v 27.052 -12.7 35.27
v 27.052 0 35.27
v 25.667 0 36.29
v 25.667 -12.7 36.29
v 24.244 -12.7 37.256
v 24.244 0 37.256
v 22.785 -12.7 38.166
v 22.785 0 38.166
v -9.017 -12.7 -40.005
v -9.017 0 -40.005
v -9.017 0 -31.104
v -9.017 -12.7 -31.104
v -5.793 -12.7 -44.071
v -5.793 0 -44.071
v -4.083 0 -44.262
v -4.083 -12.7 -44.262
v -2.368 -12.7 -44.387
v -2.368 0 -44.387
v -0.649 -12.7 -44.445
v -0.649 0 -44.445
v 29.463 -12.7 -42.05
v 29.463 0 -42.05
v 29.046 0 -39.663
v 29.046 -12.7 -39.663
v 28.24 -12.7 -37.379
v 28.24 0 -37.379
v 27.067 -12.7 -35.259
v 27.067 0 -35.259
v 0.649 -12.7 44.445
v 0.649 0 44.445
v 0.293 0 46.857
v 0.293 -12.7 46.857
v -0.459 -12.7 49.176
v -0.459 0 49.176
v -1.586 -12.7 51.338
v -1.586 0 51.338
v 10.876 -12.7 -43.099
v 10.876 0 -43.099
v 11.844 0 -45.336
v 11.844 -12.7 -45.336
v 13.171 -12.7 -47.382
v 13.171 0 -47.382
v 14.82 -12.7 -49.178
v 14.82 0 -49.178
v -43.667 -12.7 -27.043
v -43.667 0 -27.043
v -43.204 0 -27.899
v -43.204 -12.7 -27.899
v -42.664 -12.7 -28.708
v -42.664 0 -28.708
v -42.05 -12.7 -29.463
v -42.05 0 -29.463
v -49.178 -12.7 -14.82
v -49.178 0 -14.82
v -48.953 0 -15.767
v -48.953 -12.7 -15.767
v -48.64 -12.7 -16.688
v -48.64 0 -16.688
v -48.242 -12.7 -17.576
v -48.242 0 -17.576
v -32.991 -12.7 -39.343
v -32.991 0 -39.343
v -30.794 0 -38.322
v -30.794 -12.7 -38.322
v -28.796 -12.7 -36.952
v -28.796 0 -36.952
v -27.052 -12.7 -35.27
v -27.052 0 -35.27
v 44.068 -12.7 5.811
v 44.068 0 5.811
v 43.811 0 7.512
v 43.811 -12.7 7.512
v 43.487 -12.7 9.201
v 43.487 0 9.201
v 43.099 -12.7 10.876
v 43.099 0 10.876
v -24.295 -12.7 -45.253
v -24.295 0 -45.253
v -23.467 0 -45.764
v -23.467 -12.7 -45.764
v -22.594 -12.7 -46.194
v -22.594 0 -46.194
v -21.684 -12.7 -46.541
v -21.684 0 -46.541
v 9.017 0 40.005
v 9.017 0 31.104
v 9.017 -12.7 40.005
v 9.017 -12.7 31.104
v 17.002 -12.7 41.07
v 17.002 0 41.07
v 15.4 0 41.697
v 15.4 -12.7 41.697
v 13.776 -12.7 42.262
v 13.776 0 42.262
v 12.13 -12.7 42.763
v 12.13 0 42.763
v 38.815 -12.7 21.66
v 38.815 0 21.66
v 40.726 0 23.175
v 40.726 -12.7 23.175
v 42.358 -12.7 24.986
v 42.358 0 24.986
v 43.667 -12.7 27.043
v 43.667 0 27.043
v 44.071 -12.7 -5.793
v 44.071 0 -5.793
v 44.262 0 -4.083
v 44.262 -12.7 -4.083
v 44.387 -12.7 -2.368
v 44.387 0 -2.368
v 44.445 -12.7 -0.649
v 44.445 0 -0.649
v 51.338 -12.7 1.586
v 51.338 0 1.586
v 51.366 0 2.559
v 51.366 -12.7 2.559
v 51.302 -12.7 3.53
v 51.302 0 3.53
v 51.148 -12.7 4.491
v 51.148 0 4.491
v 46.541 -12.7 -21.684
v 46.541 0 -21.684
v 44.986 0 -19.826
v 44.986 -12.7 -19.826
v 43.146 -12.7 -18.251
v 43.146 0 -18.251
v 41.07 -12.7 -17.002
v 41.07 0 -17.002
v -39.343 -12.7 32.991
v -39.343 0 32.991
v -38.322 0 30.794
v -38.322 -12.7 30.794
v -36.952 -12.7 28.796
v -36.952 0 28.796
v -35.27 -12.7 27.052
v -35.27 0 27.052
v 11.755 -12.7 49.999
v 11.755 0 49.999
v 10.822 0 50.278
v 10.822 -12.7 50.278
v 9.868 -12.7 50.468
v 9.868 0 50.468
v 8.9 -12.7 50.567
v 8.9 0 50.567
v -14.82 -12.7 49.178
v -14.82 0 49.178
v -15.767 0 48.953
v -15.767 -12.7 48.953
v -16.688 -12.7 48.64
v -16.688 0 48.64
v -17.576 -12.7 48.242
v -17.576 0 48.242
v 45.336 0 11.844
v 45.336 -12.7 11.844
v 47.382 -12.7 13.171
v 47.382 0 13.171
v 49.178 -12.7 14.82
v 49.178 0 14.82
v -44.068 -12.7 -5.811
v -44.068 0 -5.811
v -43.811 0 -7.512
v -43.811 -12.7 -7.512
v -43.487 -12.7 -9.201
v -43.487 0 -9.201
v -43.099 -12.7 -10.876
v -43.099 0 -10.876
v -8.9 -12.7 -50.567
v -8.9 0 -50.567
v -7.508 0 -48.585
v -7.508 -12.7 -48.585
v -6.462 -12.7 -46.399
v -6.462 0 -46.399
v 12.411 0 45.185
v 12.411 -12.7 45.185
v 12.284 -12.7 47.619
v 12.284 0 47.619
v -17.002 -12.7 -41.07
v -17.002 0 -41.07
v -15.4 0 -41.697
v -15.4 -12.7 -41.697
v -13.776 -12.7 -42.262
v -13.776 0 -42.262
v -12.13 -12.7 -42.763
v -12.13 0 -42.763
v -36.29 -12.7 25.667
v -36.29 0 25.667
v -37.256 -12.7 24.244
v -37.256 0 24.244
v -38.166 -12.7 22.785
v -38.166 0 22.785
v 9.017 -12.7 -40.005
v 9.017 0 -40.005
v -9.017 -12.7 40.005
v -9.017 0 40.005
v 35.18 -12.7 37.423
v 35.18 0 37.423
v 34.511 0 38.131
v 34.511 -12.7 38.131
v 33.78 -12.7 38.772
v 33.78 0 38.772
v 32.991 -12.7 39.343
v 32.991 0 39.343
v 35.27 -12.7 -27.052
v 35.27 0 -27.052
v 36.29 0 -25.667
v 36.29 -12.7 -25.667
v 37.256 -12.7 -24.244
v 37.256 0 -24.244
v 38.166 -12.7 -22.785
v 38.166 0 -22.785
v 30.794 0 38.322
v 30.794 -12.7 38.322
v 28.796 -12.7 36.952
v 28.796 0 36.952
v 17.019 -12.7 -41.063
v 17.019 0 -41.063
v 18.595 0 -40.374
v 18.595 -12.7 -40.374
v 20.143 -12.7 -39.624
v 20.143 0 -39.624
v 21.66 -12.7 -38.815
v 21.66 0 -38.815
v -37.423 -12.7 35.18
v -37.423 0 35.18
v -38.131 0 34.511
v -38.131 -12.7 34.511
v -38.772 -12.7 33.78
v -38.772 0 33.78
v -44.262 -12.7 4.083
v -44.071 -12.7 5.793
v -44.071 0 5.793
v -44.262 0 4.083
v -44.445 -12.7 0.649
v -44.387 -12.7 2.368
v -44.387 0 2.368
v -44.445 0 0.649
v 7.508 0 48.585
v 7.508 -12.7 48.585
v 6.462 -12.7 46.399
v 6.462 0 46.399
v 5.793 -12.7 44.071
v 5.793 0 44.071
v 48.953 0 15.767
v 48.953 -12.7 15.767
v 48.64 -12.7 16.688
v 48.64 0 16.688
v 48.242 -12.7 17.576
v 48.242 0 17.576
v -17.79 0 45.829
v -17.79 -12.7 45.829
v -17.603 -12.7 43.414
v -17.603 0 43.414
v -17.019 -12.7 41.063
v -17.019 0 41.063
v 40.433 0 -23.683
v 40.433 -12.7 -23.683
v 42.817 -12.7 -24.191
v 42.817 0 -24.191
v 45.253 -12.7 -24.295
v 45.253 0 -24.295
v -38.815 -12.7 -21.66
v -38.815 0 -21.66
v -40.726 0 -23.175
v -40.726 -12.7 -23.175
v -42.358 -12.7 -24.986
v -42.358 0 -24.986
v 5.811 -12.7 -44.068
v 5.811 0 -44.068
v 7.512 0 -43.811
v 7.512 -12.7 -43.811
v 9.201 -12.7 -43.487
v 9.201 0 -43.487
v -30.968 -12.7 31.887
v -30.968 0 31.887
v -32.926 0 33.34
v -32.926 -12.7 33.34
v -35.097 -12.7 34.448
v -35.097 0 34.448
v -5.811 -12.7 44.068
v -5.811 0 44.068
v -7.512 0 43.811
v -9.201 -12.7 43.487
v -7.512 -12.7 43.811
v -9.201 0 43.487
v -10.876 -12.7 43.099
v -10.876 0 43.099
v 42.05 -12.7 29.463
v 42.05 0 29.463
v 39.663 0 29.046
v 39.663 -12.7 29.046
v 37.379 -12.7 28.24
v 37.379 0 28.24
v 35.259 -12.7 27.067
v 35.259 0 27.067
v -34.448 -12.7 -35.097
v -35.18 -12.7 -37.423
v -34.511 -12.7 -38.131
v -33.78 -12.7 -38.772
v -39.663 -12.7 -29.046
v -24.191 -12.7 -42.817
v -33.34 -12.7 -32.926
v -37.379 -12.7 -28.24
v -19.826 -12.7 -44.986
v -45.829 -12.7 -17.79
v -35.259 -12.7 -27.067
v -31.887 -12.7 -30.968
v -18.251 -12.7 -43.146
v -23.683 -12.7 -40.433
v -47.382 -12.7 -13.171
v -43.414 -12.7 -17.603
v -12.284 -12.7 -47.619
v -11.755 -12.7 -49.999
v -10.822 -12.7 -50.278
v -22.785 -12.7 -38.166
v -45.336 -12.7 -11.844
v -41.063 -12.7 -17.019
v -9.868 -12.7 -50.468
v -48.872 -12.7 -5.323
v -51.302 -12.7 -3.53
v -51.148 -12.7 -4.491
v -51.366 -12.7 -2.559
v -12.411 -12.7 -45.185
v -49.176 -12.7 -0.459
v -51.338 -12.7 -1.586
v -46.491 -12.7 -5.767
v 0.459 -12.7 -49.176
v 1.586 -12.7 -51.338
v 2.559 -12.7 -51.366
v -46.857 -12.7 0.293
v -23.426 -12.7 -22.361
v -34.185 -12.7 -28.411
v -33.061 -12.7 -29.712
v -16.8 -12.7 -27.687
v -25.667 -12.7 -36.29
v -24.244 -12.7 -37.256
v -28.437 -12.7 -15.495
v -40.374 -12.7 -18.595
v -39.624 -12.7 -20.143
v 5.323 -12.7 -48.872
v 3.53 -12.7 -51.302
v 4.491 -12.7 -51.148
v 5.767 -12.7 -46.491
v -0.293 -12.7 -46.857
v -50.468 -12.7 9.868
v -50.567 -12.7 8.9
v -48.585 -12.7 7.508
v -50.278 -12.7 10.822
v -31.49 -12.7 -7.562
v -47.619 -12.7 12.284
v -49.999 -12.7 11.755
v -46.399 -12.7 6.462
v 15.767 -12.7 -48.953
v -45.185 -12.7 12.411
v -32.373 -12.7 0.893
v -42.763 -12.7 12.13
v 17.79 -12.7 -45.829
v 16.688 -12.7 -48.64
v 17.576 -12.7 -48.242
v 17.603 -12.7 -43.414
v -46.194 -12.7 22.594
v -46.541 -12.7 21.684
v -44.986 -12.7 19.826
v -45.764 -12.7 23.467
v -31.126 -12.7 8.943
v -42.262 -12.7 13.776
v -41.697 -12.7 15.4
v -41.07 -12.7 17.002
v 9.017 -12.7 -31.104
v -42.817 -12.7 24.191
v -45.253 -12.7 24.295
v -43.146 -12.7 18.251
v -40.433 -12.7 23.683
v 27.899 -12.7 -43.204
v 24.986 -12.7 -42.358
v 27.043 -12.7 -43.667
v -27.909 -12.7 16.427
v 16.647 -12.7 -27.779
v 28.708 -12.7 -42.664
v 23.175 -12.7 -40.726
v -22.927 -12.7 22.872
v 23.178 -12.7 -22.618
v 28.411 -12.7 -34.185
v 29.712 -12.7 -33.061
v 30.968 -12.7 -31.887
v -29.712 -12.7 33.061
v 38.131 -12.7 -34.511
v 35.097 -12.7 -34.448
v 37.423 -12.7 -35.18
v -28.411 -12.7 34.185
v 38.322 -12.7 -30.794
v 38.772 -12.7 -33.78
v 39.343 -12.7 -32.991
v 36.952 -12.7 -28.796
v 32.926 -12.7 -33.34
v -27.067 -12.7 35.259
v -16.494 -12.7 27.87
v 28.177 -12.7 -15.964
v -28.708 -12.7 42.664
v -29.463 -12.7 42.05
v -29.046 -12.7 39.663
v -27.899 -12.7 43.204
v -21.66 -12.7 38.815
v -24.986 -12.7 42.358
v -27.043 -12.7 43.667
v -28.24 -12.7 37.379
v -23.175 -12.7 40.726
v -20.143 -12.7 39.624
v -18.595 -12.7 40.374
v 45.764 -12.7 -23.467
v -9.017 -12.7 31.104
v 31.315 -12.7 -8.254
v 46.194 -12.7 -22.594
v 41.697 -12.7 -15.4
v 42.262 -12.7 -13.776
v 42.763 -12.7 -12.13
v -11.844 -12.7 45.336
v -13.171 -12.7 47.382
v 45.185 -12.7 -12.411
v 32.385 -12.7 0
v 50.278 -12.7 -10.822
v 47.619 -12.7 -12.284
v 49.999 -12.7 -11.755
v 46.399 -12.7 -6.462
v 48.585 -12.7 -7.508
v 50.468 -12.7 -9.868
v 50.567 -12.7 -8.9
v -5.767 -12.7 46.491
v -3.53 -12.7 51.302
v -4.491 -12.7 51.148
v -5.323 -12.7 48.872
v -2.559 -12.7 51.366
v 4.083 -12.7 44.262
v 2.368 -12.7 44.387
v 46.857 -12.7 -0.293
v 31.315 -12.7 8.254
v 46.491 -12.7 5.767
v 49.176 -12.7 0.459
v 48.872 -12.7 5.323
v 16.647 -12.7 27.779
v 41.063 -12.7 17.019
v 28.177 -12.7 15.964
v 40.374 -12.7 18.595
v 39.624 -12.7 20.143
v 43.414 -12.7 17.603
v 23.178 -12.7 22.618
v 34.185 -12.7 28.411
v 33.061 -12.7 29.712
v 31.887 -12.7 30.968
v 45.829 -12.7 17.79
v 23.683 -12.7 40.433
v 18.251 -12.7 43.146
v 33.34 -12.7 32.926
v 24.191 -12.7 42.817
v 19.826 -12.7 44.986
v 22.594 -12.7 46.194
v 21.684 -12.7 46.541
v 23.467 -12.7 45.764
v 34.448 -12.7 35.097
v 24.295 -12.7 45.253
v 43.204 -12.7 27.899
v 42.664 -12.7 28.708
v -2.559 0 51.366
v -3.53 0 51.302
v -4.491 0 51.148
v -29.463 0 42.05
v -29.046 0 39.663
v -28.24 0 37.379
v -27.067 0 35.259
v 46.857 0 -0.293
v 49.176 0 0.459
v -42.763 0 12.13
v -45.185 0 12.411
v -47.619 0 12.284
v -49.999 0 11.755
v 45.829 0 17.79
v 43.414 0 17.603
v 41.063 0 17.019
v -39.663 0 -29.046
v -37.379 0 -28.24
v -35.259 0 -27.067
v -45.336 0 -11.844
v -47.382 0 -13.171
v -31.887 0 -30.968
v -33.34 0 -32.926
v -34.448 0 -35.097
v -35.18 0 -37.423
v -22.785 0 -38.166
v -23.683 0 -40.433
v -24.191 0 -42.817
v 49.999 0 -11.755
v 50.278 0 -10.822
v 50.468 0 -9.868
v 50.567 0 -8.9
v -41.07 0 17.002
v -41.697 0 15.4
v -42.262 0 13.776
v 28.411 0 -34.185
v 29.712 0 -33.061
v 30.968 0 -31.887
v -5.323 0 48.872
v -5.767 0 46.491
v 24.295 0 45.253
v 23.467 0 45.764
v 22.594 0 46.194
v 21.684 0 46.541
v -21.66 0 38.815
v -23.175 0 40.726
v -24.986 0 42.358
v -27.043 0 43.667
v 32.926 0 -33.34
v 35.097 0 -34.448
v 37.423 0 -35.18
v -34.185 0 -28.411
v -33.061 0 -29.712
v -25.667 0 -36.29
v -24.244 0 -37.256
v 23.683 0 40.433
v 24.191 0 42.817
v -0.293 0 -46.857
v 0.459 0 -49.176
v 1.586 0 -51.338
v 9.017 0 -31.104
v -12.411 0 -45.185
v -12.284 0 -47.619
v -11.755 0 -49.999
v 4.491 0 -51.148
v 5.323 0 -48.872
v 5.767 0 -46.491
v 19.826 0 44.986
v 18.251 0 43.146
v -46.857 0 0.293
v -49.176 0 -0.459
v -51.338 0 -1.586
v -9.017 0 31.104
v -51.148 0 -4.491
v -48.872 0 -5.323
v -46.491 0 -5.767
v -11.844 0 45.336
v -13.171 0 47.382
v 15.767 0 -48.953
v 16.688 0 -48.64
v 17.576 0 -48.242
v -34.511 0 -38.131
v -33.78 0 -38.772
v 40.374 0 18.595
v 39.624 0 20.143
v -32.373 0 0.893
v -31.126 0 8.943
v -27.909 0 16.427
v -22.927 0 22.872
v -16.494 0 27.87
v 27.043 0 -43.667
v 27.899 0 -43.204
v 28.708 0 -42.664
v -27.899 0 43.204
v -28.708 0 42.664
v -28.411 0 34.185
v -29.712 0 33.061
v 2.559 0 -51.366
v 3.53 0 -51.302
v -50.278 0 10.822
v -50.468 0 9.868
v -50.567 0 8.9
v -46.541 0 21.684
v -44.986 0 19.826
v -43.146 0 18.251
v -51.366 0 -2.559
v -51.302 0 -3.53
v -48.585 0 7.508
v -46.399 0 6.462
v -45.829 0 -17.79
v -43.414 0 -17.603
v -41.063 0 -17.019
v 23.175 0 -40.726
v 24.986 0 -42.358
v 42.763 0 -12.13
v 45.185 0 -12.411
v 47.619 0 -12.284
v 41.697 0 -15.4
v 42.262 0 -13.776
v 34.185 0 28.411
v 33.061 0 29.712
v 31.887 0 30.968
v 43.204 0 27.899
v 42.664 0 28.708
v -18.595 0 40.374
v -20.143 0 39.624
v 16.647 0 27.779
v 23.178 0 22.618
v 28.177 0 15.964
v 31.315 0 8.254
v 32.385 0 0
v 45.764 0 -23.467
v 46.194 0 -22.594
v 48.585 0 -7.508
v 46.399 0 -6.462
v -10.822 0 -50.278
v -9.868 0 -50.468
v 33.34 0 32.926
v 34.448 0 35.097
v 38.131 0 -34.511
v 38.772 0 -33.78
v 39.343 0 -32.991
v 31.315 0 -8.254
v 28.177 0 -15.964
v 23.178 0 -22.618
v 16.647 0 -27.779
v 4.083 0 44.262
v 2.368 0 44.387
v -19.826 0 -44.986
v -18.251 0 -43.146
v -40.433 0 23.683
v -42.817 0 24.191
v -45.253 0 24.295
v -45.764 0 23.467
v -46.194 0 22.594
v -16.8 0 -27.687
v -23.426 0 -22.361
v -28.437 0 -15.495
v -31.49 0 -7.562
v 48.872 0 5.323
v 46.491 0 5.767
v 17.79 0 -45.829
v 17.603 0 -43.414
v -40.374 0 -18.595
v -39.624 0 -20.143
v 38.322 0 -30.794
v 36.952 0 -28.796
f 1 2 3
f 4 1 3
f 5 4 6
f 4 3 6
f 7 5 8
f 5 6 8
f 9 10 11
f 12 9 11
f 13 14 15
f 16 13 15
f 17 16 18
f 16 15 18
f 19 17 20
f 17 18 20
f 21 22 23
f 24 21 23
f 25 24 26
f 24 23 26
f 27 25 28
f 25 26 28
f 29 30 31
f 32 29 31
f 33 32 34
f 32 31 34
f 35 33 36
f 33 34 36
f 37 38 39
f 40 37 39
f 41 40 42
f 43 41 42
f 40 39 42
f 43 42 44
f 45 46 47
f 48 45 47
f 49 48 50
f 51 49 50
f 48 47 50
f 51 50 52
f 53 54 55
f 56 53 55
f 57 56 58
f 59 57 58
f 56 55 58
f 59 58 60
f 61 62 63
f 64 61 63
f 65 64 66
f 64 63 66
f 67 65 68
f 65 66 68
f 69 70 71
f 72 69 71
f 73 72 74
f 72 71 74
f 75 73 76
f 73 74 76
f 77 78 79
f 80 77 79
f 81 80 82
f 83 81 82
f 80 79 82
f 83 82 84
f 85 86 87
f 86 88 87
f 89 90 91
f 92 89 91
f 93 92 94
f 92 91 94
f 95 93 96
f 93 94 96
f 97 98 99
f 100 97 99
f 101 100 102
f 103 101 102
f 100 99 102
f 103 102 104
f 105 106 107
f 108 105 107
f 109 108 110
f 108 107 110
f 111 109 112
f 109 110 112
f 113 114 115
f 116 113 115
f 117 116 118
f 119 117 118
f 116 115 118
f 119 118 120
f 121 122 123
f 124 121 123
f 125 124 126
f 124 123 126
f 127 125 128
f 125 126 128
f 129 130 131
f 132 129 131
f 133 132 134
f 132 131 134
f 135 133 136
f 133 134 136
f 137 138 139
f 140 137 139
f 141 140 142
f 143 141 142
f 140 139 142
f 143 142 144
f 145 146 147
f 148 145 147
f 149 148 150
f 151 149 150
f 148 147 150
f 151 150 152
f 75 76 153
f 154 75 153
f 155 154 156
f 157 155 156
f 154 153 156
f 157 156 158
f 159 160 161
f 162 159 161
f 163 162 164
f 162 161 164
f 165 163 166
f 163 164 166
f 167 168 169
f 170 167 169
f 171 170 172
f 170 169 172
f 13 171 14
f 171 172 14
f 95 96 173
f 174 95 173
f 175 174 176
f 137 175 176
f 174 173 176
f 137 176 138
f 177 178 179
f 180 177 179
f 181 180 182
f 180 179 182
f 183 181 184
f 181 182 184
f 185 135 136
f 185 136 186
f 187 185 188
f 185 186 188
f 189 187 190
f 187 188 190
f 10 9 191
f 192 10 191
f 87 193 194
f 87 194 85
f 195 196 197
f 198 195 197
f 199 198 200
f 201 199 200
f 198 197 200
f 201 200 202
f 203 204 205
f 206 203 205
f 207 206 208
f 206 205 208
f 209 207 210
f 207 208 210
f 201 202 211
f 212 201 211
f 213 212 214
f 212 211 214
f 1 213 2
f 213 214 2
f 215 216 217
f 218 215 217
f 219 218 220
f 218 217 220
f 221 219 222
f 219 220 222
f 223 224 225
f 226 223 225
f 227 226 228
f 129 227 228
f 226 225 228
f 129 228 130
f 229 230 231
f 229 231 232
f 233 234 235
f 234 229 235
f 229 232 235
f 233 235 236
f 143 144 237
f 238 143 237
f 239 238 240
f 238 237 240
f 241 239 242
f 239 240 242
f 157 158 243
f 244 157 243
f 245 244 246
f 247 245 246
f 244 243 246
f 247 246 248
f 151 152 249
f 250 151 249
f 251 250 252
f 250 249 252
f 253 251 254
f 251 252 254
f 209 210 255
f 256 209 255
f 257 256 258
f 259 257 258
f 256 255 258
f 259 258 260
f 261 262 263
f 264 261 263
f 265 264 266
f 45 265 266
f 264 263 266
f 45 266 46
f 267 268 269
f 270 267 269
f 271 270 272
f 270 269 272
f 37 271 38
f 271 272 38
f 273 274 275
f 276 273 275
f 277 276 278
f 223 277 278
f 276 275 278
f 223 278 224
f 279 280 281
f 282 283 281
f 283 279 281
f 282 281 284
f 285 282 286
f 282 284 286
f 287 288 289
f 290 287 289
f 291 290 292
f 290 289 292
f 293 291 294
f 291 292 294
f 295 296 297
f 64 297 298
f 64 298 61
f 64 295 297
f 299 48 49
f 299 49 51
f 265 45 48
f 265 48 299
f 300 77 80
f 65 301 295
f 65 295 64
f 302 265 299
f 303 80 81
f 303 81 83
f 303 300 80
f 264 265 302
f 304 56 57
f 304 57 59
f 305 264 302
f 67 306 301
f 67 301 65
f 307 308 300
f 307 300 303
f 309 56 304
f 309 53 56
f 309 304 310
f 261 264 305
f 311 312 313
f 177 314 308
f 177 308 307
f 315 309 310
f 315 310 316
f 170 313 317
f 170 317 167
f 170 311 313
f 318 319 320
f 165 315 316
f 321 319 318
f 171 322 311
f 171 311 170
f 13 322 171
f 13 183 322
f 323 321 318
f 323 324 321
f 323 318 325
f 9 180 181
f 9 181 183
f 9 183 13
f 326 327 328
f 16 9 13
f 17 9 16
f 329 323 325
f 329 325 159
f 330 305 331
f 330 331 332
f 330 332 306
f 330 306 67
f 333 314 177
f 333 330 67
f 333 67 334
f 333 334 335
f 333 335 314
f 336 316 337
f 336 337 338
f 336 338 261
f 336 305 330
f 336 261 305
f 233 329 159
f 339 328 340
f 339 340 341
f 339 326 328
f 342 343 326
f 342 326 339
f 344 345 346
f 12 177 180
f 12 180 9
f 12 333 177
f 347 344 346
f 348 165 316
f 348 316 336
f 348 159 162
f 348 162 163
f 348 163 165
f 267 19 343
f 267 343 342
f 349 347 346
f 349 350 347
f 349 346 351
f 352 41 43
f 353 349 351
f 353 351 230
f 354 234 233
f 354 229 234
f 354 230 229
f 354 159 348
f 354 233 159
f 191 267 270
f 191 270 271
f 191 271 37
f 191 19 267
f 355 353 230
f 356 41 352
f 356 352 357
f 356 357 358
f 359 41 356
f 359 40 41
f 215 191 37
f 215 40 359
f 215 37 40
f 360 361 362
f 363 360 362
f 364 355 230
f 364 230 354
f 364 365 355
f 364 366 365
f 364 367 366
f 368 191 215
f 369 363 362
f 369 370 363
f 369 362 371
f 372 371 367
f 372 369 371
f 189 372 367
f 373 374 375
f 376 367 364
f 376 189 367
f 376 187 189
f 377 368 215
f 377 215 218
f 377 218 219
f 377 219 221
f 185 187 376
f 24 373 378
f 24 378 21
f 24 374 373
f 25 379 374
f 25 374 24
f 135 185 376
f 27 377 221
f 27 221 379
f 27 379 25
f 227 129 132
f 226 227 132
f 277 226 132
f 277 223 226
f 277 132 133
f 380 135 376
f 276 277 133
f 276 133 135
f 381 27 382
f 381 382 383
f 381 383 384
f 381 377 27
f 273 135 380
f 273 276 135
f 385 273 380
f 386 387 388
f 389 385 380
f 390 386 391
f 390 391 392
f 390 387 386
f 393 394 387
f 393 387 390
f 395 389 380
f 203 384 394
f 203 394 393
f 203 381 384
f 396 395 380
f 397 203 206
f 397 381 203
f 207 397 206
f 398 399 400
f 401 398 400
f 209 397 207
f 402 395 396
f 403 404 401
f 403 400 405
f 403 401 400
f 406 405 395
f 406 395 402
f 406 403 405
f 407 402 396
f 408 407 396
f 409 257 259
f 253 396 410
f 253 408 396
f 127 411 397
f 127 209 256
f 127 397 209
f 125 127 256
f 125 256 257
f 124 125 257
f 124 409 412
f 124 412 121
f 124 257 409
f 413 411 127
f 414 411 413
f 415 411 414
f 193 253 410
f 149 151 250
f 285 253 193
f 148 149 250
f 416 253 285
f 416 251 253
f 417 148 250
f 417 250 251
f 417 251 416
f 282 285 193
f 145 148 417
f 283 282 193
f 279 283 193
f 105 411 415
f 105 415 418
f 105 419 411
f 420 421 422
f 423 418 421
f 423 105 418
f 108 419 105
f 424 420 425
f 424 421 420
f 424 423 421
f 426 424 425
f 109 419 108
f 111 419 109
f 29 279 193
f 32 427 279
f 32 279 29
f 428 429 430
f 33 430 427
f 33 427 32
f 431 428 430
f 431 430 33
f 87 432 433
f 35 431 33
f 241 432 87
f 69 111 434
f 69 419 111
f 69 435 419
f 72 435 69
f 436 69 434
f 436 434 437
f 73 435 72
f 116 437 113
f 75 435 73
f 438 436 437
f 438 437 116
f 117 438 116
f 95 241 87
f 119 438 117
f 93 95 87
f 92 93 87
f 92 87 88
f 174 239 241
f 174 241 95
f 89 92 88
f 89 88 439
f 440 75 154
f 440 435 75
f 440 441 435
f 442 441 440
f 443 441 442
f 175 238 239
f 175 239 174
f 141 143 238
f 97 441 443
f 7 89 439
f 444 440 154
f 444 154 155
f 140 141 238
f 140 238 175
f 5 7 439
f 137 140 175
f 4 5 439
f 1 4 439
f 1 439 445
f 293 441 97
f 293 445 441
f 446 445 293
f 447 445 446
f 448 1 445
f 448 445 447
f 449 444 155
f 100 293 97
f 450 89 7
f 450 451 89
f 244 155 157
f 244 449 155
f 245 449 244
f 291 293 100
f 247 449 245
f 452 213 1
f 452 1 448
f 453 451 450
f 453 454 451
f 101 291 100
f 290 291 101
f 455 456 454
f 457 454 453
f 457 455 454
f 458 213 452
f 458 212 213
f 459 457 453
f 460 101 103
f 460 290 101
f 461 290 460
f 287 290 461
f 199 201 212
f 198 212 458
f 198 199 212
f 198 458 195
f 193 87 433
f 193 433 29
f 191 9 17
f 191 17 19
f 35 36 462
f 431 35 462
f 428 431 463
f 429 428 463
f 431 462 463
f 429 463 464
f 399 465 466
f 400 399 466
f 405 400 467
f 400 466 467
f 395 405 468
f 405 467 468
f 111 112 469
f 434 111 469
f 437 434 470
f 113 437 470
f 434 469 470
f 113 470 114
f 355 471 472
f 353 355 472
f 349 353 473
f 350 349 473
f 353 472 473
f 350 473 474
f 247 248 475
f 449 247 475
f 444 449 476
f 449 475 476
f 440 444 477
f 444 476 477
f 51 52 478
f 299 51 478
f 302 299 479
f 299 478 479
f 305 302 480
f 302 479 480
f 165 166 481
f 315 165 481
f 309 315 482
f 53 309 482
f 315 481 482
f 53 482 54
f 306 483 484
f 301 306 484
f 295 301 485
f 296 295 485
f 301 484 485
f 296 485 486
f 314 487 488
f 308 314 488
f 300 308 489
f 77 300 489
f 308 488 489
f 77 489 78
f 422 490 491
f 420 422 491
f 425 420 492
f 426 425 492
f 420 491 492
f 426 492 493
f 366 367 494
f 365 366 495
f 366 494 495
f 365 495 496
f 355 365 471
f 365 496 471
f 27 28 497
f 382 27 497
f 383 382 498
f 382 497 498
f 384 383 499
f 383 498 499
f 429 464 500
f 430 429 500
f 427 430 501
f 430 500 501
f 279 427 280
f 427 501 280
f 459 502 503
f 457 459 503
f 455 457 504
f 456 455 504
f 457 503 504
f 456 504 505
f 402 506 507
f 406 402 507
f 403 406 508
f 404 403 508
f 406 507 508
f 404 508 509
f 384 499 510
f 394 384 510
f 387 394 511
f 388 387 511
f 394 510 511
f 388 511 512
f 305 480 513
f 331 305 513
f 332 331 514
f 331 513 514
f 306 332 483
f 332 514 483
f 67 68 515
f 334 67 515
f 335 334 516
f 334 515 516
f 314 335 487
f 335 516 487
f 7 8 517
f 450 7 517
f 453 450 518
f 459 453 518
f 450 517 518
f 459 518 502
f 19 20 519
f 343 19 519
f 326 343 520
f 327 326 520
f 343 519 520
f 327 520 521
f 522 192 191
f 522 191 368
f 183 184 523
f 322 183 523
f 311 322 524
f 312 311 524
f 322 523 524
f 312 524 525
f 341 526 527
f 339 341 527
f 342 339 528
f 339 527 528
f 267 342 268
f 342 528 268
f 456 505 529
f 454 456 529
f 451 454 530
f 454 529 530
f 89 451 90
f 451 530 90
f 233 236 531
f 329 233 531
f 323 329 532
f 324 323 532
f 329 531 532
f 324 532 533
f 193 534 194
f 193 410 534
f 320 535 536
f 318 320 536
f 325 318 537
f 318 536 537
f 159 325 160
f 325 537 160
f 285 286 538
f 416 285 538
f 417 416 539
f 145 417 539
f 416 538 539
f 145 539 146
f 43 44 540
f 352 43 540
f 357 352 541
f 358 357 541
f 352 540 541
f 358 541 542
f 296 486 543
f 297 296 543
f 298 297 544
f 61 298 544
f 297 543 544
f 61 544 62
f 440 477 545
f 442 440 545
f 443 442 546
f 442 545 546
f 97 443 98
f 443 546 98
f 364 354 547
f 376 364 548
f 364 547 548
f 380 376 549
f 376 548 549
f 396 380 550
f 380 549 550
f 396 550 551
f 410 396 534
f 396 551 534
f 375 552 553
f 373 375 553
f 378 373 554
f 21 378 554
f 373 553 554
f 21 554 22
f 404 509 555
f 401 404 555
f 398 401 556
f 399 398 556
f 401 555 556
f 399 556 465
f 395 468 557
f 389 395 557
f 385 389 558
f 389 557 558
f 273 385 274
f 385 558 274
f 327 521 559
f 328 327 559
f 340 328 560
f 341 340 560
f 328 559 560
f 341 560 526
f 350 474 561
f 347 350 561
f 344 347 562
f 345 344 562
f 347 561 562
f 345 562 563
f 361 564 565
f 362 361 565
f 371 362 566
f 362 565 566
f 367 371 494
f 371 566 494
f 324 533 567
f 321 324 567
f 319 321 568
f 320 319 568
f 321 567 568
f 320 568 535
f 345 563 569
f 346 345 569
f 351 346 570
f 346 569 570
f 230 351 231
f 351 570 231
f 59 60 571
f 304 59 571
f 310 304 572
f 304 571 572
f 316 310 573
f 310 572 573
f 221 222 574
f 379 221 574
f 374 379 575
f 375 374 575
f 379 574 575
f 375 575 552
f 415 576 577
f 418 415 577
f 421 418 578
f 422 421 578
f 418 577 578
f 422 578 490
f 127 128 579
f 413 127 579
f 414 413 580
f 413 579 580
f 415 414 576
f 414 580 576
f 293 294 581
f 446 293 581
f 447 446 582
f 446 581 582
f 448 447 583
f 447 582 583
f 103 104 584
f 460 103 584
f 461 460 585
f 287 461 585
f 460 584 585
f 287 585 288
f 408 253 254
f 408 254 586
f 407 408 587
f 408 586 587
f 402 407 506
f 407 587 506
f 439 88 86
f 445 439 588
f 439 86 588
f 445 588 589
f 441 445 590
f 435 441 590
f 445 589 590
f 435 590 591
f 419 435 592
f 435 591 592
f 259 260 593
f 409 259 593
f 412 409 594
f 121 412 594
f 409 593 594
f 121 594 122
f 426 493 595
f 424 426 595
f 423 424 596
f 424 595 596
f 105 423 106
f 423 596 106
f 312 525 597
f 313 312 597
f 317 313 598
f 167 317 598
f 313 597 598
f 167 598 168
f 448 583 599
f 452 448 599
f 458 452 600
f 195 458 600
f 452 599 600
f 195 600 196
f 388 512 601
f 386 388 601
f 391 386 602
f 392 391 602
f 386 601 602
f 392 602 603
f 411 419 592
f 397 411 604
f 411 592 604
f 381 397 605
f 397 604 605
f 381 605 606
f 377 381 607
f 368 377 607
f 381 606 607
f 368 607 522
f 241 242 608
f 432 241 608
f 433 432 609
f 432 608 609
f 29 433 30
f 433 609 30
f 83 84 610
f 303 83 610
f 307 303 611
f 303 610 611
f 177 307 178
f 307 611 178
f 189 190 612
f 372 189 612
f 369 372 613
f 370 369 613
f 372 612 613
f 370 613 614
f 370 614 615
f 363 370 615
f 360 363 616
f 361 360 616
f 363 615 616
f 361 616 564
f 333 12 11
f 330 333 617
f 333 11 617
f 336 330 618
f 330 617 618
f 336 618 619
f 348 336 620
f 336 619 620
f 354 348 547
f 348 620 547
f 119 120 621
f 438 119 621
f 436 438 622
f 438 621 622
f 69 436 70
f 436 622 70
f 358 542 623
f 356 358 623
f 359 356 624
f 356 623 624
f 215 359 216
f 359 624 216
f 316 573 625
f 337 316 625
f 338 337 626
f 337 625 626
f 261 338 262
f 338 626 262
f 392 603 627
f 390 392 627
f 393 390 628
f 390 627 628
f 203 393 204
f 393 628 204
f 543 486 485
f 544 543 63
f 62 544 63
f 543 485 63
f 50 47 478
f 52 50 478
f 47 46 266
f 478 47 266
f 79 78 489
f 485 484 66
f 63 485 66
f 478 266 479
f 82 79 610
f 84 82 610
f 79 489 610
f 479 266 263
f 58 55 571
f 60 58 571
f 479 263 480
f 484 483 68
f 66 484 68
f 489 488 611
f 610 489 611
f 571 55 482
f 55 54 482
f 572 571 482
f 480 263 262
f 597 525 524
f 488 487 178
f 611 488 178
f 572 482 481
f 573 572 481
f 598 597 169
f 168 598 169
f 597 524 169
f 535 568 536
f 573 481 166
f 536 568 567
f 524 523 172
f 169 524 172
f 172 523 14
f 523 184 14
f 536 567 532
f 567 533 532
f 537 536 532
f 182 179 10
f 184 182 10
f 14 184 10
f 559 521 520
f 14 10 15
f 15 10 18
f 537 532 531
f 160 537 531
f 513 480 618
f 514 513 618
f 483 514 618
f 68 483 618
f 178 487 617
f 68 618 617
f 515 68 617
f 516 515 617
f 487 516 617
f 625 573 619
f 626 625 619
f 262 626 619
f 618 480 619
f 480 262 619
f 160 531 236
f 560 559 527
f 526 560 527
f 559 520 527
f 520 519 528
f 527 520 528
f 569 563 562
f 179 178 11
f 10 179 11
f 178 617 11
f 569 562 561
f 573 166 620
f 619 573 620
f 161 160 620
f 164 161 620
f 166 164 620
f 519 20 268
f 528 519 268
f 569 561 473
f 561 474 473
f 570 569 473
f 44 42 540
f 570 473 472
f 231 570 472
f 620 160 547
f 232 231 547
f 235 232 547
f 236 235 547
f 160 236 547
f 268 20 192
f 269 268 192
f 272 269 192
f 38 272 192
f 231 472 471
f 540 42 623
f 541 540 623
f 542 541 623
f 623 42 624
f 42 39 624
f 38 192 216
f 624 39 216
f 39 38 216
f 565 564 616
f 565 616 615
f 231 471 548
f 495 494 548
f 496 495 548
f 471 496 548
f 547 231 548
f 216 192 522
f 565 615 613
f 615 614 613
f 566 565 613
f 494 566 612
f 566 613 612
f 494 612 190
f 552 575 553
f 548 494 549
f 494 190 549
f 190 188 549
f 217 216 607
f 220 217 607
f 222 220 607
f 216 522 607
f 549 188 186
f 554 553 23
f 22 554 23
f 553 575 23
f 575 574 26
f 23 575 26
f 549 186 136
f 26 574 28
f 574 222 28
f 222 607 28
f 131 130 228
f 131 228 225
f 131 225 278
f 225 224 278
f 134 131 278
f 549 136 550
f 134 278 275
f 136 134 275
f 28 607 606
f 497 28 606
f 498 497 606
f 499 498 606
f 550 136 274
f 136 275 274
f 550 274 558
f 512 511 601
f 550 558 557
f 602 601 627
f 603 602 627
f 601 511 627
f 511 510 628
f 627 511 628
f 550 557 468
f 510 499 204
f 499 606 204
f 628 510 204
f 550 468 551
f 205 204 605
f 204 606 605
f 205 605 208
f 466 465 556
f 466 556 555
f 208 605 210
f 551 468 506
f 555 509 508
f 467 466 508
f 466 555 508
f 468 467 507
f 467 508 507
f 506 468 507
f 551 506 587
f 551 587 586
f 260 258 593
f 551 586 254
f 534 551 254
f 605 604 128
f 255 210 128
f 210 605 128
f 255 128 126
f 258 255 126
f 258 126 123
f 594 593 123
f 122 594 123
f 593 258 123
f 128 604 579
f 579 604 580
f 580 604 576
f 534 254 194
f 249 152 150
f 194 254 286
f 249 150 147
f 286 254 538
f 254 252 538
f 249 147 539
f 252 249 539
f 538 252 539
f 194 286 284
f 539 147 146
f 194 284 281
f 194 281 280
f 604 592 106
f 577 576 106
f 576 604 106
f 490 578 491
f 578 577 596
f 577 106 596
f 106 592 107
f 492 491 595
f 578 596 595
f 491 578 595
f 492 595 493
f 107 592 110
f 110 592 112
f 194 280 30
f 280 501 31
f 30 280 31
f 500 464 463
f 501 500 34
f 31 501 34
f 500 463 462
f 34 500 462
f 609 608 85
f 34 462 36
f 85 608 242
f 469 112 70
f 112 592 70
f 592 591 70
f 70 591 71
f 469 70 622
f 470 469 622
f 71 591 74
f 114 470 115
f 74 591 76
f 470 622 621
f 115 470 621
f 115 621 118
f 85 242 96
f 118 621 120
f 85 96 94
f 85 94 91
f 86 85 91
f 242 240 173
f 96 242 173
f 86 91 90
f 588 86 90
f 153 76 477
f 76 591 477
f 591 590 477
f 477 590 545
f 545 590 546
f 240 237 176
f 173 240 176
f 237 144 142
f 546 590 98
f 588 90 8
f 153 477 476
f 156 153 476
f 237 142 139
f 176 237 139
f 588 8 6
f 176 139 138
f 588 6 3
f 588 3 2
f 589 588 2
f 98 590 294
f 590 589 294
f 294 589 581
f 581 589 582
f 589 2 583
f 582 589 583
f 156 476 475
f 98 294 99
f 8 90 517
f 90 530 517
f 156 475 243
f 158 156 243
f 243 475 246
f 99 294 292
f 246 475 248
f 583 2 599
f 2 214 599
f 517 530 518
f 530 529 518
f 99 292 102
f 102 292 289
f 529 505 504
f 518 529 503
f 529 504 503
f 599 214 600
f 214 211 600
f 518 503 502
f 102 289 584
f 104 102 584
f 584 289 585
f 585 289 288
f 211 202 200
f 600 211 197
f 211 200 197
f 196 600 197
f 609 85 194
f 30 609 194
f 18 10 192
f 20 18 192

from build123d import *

# Parameters (mm, degrees)
F1_DEPTH = 12.7
F2_COUNT = 24
F2_ANGLE = 345
F3_W     = 18.034
F3_H     = 80.01
F4_DEPTH = 25.4


with BuildPart() as f1:
    # F0 (on Front) → F1 (new body)
    with BuildSketch(Plane.XZ):
        with BuildLine():
            ThreePointArc((-5.811181, 44.0685), (-29.304398, -33.422369), (44.45, 0))
            ThreePointArc((44.45, 0), (31.659609, 31.200508), (0.649249, 44.445258))
            ThreePointArc((0.649249, 44.445258), (-2.587831, 44.374606), (-5.811181, 44.0685))
        make_face()
        with BuildLine():
            ThreePointArc((7.516504, 31.500641), (25.418598, 20.066966), (32.385, 0))
            ThreePointArc((32.385, 0), (25.418598, -20.066966), (7.516504, -31.500641))
            Line((7.516504, -31.500641), (7.516504, -39.878))
            Line((7.516504, -39.878), (-7.871554, -39.878))
            Line((-7.871554, -39.878), (-7.871554, -31.4138))
            ThreePointArc((-7.871554, -31.4138), (-32.385, 0), (-7.871554, 31.4138))
            Line((-7.871554, 31.4138), (-7.871554, 39.878))
            Line((-7.871554, 39.878), (7.516504, 39.878))
            Line((7.516504, 39.878), (7.516504, 31.500641))
        make_face(mode=Mode.SUBTRACT)
        with BuildLine():
            ThreePointArc((-5.811181, 44.0685), (-2.587831, 44.374606), (0.649249, 44.445258))
            ThreePointArc((0.649249, 44.445258), (-0.034359, 48.03246), (-1.586488, 51.337946))
            ThreePointArc((-1.586488, 51.337946), (-3.045553, 51.345424), (-4.491159, 51.147564))
            ThreePointArc((-4.491159, 51.147564), (-5.594305, 47.690663), (-5.811181, 44.0685))
        make_face()
    extrude(amount=F1_DEPTH)

    # F2: F1 ×24 about axis
    f2_axis = Axis((0, 0, 0), (0, 1, 0))


with BuildPart() as f1_1:
    add(f1.part)
    for i in range(1, F2_COUNT):
        add(f1.part.rotate(f2_axis, i * F2_ANGLE / (F2_COUNT - 1)))

    # F3 (on Front) → F4 (cut, symmetric)
    with BuildSketch(Plane.XZ):
        Rectangle(F3_W, F3_H)
    extrude(amount=F4_DEPTH, both=True, mode=Mode.SUBTRACT)


solid = f1_1.part
